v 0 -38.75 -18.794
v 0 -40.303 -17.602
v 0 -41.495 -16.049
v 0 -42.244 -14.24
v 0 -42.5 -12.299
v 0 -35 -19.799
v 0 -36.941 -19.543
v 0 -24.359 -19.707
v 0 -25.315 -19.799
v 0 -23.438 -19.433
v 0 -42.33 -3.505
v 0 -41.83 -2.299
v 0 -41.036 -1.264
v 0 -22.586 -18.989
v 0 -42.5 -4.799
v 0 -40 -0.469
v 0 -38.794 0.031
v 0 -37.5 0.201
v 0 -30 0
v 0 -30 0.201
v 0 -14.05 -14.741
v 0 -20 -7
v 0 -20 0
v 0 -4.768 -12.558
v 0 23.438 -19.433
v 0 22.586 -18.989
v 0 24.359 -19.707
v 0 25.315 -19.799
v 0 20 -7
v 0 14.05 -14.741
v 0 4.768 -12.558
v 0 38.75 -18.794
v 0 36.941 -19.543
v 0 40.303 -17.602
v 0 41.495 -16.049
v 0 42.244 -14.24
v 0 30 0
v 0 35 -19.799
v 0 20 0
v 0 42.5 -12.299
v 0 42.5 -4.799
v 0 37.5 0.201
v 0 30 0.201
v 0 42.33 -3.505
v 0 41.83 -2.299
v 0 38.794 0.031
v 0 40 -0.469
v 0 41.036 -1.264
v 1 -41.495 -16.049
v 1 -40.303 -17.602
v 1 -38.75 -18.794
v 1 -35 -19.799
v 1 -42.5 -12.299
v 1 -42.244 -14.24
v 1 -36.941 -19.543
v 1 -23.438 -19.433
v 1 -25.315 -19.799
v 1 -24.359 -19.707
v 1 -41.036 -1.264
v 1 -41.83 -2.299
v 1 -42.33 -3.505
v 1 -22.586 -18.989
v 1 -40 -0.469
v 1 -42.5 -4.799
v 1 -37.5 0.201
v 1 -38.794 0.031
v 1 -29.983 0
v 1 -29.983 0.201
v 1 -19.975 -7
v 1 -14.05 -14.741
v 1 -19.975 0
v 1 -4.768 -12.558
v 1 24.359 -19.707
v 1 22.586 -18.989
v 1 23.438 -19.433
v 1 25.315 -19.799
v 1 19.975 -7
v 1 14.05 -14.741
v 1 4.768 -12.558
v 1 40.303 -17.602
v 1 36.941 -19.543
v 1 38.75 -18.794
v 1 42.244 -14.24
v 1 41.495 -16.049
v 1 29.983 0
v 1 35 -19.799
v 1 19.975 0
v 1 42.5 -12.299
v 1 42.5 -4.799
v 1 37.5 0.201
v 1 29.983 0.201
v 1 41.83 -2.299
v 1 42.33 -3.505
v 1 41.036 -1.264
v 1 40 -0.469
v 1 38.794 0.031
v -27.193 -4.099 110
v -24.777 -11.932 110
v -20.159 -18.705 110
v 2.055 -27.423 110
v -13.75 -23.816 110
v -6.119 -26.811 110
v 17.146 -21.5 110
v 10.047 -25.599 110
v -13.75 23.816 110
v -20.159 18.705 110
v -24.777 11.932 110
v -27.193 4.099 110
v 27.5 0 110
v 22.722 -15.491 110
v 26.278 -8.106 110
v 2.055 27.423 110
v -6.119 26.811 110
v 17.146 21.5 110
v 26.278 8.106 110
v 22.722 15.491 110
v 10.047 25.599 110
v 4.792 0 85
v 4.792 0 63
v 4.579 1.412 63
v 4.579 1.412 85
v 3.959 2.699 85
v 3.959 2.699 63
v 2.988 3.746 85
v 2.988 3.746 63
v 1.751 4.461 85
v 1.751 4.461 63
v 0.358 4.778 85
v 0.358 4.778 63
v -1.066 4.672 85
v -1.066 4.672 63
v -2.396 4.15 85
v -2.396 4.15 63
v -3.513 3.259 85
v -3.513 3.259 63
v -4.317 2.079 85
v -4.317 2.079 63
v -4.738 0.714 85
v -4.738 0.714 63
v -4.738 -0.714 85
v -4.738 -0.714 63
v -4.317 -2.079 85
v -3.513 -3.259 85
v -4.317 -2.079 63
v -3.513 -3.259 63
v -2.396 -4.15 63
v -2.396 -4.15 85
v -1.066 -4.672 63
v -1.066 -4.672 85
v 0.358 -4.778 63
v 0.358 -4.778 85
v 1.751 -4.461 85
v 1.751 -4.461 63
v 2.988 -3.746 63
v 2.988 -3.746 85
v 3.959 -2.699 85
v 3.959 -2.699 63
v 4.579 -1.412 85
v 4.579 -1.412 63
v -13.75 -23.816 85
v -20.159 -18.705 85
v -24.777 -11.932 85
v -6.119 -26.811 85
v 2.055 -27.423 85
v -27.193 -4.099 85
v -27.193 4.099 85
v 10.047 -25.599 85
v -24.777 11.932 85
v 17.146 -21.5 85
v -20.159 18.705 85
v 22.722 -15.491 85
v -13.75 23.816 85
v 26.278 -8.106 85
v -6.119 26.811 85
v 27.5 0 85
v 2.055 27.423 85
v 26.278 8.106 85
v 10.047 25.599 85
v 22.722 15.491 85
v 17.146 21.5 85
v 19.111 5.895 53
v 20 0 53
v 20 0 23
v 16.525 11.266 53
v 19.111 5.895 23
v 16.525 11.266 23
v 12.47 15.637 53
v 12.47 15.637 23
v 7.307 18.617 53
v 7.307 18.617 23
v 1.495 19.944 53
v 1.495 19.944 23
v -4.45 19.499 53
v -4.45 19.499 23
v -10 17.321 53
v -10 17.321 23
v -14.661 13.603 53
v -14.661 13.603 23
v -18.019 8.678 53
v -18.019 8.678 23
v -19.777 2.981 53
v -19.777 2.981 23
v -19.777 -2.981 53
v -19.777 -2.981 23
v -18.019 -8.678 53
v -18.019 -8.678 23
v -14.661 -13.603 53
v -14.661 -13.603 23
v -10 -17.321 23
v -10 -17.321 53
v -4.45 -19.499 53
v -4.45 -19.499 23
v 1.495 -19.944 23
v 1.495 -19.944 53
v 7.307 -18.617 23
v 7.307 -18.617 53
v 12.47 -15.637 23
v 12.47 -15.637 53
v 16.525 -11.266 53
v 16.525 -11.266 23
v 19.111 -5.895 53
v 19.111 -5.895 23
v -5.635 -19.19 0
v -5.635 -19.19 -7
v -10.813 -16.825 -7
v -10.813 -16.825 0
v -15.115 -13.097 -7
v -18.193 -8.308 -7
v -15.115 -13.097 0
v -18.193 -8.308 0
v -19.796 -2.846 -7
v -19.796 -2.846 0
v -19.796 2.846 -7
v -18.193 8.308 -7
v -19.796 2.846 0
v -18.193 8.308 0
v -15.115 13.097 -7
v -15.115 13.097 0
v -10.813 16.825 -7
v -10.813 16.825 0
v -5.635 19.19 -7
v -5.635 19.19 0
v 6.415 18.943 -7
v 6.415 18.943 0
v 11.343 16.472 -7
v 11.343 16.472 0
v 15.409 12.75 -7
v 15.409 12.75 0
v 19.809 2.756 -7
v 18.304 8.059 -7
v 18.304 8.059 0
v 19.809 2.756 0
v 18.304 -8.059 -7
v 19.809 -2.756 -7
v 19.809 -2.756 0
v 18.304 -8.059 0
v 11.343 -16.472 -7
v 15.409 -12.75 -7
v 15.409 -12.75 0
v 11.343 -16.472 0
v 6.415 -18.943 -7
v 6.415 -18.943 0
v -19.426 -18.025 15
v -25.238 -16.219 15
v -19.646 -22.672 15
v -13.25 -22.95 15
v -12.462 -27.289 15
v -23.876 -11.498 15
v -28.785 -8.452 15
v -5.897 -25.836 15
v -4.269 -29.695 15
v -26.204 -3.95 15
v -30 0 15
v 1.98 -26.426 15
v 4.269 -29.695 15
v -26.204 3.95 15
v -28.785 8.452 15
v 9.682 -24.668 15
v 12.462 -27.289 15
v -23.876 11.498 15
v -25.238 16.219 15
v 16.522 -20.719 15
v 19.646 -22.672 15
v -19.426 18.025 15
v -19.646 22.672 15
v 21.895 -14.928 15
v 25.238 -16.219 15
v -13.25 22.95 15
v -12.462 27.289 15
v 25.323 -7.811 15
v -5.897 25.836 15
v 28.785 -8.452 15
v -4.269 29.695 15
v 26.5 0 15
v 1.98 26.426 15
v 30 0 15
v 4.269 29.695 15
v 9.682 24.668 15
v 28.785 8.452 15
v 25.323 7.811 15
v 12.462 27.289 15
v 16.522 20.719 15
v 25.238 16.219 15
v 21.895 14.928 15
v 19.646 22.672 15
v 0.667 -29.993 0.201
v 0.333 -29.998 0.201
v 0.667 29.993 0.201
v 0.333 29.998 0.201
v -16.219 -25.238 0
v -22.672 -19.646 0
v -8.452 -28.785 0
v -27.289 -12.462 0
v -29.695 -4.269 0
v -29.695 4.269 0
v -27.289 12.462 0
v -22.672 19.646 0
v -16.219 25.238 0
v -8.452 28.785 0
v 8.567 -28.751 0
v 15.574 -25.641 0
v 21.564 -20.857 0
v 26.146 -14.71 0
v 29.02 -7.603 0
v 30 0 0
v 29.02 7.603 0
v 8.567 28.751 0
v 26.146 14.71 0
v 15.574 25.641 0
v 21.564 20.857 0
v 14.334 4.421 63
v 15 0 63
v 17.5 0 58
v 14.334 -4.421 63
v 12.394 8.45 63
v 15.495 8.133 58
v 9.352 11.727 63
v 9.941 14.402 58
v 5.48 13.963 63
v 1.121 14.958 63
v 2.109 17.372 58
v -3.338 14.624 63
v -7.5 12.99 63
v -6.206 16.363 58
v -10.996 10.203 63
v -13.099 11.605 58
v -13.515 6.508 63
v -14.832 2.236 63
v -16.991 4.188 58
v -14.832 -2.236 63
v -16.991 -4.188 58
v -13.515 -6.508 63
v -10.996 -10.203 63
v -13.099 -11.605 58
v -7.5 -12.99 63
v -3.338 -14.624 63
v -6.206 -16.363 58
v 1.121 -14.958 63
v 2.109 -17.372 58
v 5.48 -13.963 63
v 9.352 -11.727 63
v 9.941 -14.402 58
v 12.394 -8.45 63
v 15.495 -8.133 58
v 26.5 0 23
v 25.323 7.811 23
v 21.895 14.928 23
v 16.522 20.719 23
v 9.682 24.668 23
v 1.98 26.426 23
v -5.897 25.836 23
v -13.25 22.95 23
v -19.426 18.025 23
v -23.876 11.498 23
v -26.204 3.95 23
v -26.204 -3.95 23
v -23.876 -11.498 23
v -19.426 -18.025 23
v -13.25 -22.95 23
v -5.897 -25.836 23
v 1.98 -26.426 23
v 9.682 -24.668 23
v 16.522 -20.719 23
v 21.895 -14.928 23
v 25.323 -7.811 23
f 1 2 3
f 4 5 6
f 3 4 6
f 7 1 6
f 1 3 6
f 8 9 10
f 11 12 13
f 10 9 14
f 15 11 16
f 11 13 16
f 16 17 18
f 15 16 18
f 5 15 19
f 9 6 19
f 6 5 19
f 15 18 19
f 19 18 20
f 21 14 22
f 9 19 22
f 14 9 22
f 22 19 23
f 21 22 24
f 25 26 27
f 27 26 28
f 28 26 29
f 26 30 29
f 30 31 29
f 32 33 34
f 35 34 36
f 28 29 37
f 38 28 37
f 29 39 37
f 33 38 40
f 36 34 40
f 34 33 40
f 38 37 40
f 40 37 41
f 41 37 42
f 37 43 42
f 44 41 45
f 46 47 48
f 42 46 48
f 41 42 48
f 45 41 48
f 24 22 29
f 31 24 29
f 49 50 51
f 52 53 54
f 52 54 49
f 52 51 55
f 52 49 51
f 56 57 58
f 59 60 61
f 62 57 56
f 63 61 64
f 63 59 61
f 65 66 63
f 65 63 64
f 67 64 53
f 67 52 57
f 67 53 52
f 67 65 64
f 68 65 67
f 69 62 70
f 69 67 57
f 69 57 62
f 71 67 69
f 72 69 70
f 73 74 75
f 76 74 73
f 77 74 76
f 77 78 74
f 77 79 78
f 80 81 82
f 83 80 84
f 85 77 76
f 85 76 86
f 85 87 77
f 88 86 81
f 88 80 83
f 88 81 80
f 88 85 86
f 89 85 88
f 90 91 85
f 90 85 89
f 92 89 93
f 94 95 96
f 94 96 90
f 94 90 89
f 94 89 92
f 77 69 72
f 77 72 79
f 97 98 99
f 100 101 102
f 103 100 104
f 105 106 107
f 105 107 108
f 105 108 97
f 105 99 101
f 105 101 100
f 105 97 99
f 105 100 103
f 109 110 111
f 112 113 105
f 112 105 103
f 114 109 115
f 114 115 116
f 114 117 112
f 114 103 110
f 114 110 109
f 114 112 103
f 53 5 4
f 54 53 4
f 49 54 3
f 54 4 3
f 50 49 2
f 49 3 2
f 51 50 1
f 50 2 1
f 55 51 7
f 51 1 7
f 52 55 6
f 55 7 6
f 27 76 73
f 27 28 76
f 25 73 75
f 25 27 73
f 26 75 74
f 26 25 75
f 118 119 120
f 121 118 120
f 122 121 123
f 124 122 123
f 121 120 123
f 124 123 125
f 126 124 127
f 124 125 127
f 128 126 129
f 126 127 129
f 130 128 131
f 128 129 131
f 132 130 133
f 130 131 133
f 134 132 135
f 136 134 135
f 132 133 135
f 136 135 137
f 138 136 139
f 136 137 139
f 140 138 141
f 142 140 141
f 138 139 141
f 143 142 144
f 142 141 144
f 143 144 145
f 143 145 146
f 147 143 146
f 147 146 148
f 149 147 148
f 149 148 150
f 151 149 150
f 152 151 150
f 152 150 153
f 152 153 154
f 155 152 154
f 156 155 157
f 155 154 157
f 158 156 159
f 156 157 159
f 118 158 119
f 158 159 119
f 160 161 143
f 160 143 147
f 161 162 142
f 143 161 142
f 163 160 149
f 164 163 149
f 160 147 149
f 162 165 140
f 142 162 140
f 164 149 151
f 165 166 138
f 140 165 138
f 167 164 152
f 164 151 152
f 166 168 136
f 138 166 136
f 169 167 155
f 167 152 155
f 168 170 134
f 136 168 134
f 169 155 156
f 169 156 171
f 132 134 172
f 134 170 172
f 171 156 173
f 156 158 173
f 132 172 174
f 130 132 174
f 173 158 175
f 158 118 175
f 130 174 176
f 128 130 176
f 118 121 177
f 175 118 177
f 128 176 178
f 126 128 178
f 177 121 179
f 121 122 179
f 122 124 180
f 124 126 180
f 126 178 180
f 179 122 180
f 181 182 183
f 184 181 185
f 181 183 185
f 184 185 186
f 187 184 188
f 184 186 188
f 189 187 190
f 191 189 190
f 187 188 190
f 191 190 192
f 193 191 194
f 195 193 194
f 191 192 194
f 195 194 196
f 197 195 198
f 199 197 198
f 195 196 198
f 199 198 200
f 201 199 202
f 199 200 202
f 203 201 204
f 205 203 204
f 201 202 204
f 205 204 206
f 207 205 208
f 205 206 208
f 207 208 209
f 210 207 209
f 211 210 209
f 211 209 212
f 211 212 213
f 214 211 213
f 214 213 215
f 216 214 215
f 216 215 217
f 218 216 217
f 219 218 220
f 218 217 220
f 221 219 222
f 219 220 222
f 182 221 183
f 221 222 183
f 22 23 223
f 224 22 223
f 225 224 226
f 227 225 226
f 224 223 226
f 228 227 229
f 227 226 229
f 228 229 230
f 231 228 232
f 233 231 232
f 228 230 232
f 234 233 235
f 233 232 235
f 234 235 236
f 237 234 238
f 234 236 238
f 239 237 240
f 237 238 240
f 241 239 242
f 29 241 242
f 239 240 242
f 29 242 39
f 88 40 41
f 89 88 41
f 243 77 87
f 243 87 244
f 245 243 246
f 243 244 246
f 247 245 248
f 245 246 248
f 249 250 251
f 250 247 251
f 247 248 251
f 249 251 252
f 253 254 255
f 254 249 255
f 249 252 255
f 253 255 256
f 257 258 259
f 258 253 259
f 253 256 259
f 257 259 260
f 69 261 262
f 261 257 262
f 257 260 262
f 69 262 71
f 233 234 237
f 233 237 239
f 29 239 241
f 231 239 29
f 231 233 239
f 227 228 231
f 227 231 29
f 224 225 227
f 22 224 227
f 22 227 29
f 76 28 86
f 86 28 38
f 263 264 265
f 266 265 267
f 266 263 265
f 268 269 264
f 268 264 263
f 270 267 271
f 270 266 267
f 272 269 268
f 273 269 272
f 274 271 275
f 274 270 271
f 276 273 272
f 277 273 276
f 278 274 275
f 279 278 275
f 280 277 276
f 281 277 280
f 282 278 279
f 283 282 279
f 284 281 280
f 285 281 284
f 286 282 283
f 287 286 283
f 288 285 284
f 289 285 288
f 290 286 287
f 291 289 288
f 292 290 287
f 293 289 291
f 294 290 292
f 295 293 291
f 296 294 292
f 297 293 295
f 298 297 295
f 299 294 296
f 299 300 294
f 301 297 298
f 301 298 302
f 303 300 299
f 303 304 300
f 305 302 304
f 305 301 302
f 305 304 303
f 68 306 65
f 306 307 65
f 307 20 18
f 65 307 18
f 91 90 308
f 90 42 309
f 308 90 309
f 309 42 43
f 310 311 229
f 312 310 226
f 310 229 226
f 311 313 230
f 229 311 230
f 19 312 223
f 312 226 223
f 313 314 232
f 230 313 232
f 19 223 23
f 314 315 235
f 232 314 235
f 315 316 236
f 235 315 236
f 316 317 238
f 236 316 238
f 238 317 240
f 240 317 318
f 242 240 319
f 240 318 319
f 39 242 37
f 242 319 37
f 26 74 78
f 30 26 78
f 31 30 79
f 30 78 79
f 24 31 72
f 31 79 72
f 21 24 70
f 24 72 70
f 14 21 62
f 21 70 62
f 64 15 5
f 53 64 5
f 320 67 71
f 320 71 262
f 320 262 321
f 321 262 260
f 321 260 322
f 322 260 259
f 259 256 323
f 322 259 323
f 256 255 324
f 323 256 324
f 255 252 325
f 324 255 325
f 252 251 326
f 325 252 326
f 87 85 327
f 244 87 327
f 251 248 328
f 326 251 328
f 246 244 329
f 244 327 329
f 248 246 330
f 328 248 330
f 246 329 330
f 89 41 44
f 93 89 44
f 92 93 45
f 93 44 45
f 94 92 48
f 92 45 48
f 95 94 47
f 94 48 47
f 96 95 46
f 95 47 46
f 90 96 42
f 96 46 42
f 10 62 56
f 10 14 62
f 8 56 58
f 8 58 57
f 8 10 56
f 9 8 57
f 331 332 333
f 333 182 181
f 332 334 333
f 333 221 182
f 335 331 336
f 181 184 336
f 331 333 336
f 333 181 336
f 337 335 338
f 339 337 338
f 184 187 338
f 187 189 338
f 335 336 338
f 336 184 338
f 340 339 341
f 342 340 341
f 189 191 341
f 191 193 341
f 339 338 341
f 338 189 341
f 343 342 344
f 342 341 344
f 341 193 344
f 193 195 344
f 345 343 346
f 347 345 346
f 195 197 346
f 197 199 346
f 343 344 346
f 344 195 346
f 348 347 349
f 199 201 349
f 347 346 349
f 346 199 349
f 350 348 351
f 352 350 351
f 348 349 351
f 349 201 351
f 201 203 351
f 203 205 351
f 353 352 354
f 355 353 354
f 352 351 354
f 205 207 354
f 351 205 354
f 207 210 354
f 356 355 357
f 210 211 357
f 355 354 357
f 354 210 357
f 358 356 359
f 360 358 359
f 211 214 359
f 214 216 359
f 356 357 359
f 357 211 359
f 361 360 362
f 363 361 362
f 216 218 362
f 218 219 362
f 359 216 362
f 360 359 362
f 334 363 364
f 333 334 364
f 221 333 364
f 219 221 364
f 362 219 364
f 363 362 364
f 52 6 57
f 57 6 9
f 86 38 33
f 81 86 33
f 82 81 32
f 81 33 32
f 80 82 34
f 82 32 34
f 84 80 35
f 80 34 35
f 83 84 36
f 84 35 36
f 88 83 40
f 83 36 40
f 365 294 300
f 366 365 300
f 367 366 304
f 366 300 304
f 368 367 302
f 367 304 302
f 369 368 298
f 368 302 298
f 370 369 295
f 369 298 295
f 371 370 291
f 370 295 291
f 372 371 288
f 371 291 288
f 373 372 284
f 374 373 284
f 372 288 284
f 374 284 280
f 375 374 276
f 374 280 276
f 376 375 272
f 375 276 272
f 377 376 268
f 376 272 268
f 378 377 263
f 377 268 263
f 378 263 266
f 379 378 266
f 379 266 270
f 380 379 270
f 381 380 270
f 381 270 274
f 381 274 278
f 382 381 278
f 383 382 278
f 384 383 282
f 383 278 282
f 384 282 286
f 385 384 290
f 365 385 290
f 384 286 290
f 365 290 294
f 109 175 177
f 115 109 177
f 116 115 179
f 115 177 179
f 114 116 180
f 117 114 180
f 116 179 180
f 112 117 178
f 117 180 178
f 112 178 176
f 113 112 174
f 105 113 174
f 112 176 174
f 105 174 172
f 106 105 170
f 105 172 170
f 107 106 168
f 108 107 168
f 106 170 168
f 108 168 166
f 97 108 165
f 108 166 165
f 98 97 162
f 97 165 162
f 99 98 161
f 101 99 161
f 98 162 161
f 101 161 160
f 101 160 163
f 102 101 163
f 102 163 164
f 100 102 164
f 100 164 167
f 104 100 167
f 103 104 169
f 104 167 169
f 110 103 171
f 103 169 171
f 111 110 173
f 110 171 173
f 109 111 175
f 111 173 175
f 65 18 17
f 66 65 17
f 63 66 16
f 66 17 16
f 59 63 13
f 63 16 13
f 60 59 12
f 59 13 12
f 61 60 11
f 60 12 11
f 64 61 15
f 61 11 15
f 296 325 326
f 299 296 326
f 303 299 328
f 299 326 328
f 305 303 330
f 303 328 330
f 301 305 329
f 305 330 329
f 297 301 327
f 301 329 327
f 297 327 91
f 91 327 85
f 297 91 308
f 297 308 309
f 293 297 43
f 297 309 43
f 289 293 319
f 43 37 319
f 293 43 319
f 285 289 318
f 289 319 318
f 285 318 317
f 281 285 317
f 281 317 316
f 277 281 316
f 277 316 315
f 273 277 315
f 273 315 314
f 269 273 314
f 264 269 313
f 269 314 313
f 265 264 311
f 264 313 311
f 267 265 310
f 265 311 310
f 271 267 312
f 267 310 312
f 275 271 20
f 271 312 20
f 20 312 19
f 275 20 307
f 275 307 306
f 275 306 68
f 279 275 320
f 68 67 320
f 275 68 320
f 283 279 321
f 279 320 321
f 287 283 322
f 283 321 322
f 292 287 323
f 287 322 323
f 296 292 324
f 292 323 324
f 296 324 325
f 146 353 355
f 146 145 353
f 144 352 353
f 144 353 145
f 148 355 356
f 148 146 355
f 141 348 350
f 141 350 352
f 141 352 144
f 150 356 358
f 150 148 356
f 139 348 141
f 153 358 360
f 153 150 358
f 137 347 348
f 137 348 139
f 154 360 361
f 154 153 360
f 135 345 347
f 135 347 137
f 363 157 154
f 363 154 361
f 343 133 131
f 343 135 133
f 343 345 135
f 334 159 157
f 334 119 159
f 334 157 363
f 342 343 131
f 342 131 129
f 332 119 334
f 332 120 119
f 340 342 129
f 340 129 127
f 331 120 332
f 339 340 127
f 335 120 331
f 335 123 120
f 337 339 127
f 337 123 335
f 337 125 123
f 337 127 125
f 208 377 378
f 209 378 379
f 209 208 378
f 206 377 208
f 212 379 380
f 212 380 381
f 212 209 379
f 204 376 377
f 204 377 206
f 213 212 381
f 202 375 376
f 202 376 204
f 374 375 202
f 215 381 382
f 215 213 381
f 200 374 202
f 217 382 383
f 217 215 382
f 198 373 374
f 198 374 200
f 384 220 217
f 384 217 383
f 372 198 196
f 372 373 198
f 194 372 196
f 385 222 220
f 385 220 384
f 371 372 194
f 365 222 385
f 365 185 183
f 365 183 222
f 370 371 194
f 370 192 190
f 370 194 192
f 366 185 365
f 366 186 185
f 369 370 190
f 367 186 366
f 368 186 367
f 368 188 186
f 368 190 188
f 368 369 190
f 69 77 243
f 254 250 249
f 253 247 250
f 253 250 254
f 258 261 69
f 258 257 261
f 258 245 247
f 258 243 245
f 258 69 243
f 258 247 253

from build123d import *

# Parameters (mm, degrees)
F0_R      = 30
F1_DEPTH  = 15
F2_R      = 26.5
F3_DEPTH  = 8
F4_R      = 20
F5_DEPTH  = 40
F6_R      = 20
F7_DEPTH  = 7
F9_DEPTH  = 1
F11_DEPTH = 25
F12_R     = 5
F13_SIZE2 = 10
F13_SIZE  = 5
F14_R     = 1
F15_DEPTH = 15
F16_R     = 4.7918026285
F16_R_2   = 1
F17_DEPTH = 22
F18_R     = 27.5
F18_R_2   = 4.7918026285
F19_DEPTH = 25


# Not quite as in the source:
# - a feature names something its author has since deleted; it is built from what else it names


with BuildPart() as f1:
    # F0 (on Top) → F1 (new body)
    with BuildSketch(Plane.XY):
        Circle(F0_R)
    extrude(amount=F1_DEPTH)

    # F2 (on face) → F3 (join)
    with BuildSketch(Plane.XY.offset(15)):
        Circle(F2_R)
    extrude(amount=F3_DEPTH)

    # F4 (on face) → F5 (join)
    with BuildSketch(Plane.XY.offset(23)):
        Circle(F4_R)
    extrude(amount=F5_DEPTH)

    # F6 (on face) → F7 (join)
    with BuildSketch(Plane(origin=(0, 0, 0), x_dir=(1, 0, 0), z_dir=(0, 0, -1))):
        Circle(F6_R)
    extrude(amount=F7_DEPTH)

    # F8 (on Right) → F9 (join)
    with BuildSketch(Plane.YZ):
        with BuildLine():
            Line((37.5, 0.200964841), (0, 0.200964841))
            Line((0, 0.200964841), (0, -19.799035159))
            Line((0, -19.799035159), (35, -19.799035159))
            ThreePointArc((35, -19.799035159), (40.3033008589, -17.6023360179), (42.5, -12.299035159))
            Line((42.5, -12.299035159), (42.5, -4.799035159))
            ThreePointArc((42.5, -4.799035159), (41.0355339059, -1.2635012531), (37.5, 0.200964841))
        make_face()
        with BuildLine():
            Line((0, -19.799035159), (0, 0.200964841))
            Line((0, 0.200964841), (-37.5, 0.200964841))
            ThreePointArc((-37.5, 0.200964841), (-41.0355339059, -1.2635012531), (-42.5, -4.799035159))
            Line((-42.5, -4.799035159), (-42.5, -12.299035159))
            ThreePointArc((-42.5, -12.299035159), (-40.3033008589, -17.6023360179), (-35, -19.799035159))
            Line((-35, -19.799035159), (0, -19.799035159))
        make_face()
    extrude(amount=F9_DEPTH)

    # F10 (on face) → F11 (cut)
    with BuildSketch(Plane.YZ.offset(1)):
        with BuildLine():
            Line((-23.7842038121, -19.799035159), (23.7842038121, -19.799035159))
            ThreePointArc((23.7842038121, -19.799035159), (0, -12.2829212631), (-23.7842038121, -19.799035159))
        make_face()
    extrude(amount=-F11_DEPTH, mode=Mode.SUBTRACT)

    # F12
    f12_edges = [f1.edges().sort_by_distance(p)[0] for p in [
        (0.5, -23.784204, -19.799035),
        (0.5, 23.784204, -19.799035),
    ]]
    fillet(f12_edges, radius=F12_R)

    # F13
    f13_edges = [f1.edges().sort_by_distance(p)[0] for p in [
        (-20, 0, 63),
    ]]
    f13_side = f1.faces().sort_by_distance((0, 0, 63))[0]
    chamfer(f13_edges, length=F13_SIZE, length2=F13_SIZE2, reference=f13_side)

    # F14 (on face) → F15 (join)
    with BuildSketch(Plane.XY.offset(63)):
        Circle(F14_R)
    extrude(amount=F15_DEPTH)

    # F16 (on face) → F17 (join)
    with BuildSketch(Plane.XY.offset(63)):
        Circle(F16_R)
        Circle(F16_R_2, mode=Mode.SUBTRACT)
        Circle(F16_R_2)
    extrude(amount=F17_DEPTH)

    # F18 (on face) → F19 (join)
    with BuildSketch(Plane.XY.offset(85)):
        Circle(F18_R)
        Circle(F18_R_2, mode=Mode.SUBTRACT)
        Circle(F18_R_2)
    extrude(amount=F19_DEPTH)


solid = f1.part
